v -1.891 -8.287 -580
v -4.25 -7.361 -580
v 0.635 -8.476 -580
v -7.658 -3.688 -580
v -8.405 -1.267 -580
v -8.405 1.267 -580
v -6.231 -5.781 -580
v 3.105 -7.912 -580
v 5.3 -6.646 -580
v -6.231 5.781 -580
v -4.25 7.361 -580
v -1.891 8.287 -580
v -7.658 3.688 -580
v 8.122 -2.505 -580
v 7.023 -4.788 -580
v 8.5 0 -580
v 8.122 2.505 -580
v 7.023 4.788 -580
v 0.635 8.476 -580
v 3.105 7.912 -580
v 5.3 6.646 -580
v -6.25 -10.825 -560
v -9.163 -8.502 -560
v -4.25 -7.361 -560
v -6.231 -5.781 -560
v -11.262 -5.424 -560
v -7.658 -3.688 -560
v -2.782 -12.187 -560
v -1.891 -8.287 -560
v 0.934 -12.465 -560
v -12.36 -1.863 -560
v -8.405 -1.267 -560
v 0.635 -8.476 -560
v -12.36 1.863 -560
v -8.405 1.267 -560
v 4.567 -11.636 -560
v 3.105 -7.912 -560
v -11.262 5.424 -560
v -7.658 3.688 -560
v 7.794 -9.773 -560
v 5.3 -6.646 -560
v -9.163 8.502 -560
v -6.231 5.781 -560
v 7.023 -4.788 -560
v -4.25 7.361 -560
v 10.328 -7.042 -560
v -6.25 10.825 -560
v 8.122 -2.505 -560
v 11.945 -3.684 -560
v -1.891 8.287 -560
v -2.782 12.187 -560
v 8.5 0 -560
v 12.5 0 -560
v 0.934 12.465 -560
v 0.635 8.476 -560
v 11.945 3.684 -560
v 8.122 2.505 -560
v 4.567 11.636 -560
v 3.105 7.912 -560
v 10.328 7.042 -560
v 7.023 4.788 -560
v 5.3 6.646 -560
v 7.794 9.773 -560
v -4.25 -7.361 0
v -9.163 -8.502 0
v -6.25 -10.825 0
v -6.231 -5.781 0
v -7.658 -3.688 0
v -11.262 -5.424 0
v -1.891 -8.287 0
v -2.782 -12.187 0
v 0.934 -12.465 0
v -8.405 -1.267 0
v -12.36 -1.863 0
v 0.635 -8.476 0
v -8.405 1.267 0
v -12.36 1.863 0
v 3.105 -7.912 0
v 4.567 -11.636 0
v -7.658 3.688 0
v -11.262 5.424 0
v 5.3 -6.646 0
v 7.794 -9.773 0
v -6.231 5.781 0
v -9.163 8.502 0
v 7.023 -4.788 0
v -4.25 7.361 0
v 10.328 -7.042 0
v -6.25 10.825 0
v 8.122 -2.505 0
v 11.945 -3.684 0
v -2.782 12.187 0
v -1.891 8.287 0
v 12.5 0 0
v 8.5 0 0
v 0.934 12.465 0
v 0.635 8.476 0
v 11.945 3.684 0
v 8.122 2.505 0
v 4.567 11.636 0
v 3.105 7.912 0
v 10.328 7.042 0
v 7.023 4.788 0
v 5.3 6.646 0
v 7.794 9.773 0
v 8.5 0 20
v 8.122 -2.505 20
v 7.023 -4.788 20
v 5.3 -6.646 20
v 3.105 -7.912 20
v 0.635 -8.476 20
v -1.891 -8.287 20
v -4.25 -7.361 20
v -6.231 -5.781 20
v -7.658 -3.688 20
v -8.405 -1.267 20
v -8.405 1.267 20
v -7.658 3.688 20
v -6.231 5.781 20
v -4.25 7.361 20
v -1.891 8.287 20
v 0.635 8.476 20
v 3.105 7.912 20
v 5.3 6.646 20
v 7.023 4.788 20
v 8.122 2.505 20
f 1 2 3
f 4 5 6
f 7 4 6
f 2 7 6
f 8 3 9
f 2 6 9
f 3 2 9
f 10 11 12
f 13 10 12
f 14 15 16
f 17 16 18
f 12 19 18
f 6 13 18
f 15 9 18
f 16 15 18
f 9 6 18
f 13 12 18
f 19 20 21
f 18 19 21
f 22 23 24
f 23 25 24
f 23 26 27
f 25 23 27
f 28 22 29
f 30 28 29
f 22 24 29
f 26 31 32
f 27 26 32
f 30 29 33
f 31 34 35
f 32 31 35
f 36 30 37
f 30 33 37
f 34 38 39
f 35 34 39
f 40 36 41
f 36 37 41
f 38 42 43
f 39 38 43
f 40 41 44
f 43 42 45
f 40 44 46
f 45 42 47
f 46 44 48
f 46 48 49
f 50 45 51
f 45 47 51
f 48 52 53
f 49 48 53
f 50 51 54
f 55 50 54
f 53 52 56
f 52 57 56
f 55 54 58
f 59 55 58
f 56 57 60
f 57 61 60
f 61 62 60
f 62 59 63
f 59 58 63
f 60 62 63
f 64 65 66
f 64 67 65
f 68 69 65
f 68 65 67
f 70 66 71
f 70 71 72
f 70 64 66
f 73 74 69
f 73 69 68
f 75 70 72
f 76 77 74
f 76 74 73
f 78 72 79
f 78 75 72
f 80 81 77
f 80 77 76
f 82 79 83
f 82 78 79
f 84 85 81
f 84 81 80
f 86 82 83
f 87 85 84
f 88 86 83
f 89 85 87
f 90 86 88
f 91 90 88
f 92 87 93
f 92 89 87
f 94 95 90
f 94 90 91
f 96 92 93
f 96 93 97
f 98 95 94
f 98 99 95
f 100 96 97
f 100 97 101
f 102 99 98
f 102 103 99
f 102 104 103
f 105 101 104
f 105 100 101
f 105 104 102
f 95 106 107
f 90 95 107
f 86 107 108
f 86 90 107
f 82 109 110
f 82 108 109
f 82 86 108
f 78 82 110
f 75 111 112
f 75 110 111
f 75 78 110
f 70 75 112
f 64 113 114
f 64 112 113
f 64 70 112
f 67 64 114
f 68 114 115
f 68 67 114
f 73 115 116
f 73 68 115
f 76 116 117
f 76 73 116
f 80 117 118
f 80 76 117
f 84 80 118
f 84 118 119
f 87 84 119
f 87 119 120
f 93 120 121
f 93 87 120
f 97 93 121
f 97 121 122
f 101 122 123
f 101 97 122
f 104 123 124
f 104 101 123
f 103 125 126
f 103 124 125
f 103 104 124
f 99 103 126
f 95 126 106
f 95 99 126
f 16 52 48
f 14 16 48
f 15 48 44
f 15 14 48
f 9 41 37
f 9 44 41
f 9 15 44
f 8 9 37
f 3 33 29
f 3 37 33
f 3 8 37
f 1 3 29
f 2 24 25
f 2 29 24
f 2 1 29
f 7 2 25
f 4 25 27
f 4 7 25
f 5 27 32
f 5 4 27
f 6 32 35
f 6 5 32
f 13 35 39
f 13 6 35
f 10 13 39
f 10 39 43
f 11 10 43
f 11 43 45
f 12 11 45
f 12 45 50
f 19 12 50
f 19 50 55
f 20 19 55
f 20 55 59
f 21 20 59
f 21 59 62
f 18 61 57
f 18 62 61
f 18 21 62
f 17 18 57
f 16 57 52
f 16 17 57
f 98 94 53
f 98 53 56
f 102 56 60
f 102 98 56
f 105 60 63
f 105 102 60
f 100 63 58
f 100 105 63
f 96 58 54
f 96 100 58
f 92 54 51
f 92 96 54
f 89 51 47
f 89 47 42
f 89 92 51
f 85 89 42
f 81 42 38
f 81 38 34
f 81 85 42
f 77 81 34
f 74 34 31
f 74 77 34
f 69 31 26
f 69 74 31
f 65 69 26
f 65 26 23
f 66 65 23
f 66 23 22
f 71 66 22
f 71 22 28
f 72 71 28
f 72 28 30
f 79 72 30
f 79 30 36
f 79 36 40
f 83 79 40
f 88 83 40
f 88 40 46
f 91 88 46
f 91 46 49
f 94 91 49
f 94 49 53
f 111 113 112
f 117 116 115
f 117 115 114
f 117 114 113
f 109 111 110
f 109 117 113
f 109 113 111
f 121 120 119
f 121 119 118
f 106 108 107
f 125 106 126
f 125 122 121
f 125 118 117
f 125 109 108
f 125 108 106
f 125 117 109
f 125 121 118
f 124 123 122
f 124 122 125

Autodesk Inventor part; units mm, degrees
ref_plane "YZ Plane" through (0, 0, 0) normal (1, 0, 0) x (0, 1, 0)
ref_plane "XZ Plane" through (0, 0, 0) normal (0, 1, 0) x (-1, 0, 0)
ref_plane "XY Plane" through (0, 0, 0) normal (0, 0, 1) x (1, 0, 0)
sketch "草图1" plane through (0, 0, 0) normal (0, 0, 1) x (1, 0, 0)
  circle A0 centre (0, 0) radius 12.5
  dimension "d0" = 25
extrude "拉伸1" add sketch "草图1" against normal blind 560
sketch "草图2" plane through (0, 0, 0) normal (0, 0, 1) x (1, 0, 0)
  circle A0 centre (0, 0) radius 8.5
  dimension "d3" = 17
extrude "拉伸2" add sketch "草图2" along normal blind 20
pattern_linear "矩形阵列1" count 2 spacing 580 along (0, 0, -1) of "拉伸2"
properties part number "载板滚柱"
